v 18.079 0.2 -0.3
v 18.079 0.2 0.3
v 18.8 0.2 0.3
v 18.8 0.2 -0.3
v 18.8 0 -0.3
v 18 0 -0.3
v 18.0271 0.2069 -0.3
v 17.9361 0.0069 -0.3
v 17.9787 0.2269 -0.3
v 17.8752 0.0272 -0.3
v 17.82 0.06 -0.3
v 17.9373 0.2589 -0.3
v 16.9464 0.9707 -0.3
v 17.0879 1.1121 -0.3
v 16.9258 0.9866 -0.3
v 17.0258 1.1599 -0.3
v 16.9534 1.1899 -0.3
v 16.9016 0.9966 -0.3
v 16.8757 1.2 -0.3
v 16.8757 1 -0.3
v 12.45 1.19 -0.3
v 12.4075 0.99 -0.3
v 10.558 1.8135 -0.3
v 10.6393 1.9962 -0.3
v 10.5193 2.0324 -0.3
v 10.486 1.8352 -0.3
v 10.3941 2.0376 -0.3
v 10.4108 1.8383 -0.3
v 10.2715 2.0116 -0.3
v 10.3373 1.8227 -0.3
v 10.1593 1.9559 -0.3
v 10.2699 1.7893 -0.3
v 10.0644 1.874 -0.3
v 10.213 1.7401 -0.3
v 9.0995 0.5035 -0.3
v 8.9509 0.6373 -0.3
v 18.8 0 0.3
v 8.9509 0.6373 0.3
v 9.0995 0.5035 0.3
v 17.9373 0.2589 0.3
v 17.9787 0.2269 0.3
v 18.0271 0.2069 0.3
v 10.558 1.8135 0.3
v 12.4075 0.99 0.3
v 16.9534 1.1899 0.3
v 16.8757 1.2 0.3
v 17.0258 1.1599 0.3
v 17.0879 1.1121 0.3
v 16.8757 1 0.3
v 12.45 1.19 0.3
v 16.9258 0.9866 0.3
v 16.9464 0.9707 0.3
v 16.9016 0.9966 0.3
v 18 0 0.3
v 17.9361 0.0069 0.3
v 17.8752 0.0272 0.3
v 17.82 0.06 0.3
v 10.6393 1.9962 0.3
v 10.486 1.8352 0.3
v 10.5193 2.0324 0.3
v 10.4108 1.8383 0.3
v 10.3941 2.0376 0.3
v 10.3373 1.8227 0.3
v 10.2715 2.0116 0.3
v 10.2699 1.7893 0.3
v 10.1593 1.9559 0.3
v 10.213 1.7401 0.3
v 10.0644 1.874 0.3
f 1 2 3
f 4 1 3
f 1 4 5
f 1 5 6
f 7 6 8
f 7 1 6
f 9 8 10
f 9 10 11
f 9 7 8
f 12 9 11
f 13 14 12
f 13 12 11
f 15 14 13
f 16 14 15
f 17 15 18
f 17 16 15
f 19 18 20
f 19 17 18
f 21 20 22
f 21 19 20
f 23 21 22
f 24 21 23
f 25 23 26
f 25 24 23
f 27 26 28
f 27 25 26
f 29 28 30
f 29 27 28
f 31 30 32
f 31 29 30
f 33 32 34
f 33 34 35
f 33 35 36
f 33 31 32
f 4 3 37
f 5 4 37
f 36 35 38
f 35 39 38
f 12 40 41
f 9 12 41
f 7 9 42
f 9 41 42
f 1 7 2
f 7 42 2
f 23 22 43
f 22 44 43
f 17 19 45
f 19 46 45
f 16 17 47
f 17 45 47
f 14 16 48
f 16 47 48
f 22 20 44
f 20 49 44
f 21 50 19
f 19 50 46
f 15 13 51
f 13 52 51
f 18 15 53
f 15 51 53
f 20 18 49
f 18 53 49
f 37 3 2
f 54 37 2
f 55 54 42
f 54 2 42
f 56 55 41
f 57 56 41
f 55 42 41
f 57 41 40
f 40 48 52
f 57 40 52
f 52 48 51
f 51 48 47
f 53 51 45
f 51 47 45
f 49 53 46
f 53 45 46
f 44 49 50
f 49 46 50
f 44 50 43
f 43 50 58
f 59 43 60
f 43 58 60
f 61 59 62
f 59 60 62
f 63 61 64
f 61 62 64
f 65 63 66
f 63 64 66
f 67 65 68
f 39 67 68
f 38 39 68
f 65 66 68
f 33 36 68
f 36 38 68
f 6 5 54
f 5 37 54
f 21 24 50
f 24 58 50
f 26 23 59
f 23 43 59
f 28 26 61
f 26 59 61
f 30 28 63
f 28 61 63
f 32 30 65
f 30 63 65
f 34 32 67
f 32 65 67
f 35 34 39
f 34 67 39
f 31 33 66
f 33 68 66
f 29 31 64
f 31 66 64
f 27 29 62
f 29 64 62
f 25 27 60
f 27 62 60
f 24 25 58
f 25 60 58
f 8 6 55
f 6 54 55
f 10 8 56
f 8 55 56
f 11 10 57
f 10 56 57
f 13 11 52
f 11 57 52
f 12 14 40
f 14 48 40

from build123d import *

# Parameters (mm, degrees)
RESSALTO_EXTRUS_O1_DEPTH = 0.3


with BuildPart() as part:
    # Esboço1 → Ressalto-extrusão1 (new body, symmetric)
    with BuildSketch(Plane.XY):
        with BuildLine():
            Line((18.8, 0.2), (18.8, 0))
            Line((18.8, 0), (18, 0))
            ThreePointArc((18, 0), (17.90513167, 0.015395011), (17.82, 0.06))
            Line((17.82, 0.06), (16.946446609, 0.970710678))
            ThreePointArc((16.946446609, 0.970710678), (16.914021314, 0.992429091), (16.875735931, 1))
            Line((16.875735931, 1), (12.407488688, 0.99))
            Line((12.407488688, 0.99), (10.557971552, 1.813458083))
            ThreePointArc((10.557971552, 1.813458083), (10.373577052, 1.832838725), (10.213007112, 1.740133627))
            Line((10.213007112, 1.740133627), (9.099531826, 0.503494039))
            Line((9.099531826, 0.503494039), (8.95090286, 0.637320161))
            Line((8.95090286, 0.637320161), (10.064378147, 1.873959748))
            ThreePointArc((10.064378147, 1.873959748), (10.331994714, 2.028468246), (10.639318881, 1.996167174))
            Line((10.639318881, 1.996167174), (12.45, 1.19))
            Line((12.45, 1.19), (16.875735931, 1.2))
            ThreePointArc((16.875735931, 1.2), (16.990592571, 1.177288457), (17.087867966, 1.112132034))
            Line((17.087867966, 1.112132034), (17.937254364, 0.258898547))
            ThreePointArc((17.937254364, 0.258898547), (18.002249513, 0.215310679), (18.078994902, 0.2))
            Line((18.078994902, 0.2), (18.8, 0.2))
        make_face()
    extrude(amount=RESSALTO_EXTRUS_O1_DEPTH, both=True)


solid = part.part
